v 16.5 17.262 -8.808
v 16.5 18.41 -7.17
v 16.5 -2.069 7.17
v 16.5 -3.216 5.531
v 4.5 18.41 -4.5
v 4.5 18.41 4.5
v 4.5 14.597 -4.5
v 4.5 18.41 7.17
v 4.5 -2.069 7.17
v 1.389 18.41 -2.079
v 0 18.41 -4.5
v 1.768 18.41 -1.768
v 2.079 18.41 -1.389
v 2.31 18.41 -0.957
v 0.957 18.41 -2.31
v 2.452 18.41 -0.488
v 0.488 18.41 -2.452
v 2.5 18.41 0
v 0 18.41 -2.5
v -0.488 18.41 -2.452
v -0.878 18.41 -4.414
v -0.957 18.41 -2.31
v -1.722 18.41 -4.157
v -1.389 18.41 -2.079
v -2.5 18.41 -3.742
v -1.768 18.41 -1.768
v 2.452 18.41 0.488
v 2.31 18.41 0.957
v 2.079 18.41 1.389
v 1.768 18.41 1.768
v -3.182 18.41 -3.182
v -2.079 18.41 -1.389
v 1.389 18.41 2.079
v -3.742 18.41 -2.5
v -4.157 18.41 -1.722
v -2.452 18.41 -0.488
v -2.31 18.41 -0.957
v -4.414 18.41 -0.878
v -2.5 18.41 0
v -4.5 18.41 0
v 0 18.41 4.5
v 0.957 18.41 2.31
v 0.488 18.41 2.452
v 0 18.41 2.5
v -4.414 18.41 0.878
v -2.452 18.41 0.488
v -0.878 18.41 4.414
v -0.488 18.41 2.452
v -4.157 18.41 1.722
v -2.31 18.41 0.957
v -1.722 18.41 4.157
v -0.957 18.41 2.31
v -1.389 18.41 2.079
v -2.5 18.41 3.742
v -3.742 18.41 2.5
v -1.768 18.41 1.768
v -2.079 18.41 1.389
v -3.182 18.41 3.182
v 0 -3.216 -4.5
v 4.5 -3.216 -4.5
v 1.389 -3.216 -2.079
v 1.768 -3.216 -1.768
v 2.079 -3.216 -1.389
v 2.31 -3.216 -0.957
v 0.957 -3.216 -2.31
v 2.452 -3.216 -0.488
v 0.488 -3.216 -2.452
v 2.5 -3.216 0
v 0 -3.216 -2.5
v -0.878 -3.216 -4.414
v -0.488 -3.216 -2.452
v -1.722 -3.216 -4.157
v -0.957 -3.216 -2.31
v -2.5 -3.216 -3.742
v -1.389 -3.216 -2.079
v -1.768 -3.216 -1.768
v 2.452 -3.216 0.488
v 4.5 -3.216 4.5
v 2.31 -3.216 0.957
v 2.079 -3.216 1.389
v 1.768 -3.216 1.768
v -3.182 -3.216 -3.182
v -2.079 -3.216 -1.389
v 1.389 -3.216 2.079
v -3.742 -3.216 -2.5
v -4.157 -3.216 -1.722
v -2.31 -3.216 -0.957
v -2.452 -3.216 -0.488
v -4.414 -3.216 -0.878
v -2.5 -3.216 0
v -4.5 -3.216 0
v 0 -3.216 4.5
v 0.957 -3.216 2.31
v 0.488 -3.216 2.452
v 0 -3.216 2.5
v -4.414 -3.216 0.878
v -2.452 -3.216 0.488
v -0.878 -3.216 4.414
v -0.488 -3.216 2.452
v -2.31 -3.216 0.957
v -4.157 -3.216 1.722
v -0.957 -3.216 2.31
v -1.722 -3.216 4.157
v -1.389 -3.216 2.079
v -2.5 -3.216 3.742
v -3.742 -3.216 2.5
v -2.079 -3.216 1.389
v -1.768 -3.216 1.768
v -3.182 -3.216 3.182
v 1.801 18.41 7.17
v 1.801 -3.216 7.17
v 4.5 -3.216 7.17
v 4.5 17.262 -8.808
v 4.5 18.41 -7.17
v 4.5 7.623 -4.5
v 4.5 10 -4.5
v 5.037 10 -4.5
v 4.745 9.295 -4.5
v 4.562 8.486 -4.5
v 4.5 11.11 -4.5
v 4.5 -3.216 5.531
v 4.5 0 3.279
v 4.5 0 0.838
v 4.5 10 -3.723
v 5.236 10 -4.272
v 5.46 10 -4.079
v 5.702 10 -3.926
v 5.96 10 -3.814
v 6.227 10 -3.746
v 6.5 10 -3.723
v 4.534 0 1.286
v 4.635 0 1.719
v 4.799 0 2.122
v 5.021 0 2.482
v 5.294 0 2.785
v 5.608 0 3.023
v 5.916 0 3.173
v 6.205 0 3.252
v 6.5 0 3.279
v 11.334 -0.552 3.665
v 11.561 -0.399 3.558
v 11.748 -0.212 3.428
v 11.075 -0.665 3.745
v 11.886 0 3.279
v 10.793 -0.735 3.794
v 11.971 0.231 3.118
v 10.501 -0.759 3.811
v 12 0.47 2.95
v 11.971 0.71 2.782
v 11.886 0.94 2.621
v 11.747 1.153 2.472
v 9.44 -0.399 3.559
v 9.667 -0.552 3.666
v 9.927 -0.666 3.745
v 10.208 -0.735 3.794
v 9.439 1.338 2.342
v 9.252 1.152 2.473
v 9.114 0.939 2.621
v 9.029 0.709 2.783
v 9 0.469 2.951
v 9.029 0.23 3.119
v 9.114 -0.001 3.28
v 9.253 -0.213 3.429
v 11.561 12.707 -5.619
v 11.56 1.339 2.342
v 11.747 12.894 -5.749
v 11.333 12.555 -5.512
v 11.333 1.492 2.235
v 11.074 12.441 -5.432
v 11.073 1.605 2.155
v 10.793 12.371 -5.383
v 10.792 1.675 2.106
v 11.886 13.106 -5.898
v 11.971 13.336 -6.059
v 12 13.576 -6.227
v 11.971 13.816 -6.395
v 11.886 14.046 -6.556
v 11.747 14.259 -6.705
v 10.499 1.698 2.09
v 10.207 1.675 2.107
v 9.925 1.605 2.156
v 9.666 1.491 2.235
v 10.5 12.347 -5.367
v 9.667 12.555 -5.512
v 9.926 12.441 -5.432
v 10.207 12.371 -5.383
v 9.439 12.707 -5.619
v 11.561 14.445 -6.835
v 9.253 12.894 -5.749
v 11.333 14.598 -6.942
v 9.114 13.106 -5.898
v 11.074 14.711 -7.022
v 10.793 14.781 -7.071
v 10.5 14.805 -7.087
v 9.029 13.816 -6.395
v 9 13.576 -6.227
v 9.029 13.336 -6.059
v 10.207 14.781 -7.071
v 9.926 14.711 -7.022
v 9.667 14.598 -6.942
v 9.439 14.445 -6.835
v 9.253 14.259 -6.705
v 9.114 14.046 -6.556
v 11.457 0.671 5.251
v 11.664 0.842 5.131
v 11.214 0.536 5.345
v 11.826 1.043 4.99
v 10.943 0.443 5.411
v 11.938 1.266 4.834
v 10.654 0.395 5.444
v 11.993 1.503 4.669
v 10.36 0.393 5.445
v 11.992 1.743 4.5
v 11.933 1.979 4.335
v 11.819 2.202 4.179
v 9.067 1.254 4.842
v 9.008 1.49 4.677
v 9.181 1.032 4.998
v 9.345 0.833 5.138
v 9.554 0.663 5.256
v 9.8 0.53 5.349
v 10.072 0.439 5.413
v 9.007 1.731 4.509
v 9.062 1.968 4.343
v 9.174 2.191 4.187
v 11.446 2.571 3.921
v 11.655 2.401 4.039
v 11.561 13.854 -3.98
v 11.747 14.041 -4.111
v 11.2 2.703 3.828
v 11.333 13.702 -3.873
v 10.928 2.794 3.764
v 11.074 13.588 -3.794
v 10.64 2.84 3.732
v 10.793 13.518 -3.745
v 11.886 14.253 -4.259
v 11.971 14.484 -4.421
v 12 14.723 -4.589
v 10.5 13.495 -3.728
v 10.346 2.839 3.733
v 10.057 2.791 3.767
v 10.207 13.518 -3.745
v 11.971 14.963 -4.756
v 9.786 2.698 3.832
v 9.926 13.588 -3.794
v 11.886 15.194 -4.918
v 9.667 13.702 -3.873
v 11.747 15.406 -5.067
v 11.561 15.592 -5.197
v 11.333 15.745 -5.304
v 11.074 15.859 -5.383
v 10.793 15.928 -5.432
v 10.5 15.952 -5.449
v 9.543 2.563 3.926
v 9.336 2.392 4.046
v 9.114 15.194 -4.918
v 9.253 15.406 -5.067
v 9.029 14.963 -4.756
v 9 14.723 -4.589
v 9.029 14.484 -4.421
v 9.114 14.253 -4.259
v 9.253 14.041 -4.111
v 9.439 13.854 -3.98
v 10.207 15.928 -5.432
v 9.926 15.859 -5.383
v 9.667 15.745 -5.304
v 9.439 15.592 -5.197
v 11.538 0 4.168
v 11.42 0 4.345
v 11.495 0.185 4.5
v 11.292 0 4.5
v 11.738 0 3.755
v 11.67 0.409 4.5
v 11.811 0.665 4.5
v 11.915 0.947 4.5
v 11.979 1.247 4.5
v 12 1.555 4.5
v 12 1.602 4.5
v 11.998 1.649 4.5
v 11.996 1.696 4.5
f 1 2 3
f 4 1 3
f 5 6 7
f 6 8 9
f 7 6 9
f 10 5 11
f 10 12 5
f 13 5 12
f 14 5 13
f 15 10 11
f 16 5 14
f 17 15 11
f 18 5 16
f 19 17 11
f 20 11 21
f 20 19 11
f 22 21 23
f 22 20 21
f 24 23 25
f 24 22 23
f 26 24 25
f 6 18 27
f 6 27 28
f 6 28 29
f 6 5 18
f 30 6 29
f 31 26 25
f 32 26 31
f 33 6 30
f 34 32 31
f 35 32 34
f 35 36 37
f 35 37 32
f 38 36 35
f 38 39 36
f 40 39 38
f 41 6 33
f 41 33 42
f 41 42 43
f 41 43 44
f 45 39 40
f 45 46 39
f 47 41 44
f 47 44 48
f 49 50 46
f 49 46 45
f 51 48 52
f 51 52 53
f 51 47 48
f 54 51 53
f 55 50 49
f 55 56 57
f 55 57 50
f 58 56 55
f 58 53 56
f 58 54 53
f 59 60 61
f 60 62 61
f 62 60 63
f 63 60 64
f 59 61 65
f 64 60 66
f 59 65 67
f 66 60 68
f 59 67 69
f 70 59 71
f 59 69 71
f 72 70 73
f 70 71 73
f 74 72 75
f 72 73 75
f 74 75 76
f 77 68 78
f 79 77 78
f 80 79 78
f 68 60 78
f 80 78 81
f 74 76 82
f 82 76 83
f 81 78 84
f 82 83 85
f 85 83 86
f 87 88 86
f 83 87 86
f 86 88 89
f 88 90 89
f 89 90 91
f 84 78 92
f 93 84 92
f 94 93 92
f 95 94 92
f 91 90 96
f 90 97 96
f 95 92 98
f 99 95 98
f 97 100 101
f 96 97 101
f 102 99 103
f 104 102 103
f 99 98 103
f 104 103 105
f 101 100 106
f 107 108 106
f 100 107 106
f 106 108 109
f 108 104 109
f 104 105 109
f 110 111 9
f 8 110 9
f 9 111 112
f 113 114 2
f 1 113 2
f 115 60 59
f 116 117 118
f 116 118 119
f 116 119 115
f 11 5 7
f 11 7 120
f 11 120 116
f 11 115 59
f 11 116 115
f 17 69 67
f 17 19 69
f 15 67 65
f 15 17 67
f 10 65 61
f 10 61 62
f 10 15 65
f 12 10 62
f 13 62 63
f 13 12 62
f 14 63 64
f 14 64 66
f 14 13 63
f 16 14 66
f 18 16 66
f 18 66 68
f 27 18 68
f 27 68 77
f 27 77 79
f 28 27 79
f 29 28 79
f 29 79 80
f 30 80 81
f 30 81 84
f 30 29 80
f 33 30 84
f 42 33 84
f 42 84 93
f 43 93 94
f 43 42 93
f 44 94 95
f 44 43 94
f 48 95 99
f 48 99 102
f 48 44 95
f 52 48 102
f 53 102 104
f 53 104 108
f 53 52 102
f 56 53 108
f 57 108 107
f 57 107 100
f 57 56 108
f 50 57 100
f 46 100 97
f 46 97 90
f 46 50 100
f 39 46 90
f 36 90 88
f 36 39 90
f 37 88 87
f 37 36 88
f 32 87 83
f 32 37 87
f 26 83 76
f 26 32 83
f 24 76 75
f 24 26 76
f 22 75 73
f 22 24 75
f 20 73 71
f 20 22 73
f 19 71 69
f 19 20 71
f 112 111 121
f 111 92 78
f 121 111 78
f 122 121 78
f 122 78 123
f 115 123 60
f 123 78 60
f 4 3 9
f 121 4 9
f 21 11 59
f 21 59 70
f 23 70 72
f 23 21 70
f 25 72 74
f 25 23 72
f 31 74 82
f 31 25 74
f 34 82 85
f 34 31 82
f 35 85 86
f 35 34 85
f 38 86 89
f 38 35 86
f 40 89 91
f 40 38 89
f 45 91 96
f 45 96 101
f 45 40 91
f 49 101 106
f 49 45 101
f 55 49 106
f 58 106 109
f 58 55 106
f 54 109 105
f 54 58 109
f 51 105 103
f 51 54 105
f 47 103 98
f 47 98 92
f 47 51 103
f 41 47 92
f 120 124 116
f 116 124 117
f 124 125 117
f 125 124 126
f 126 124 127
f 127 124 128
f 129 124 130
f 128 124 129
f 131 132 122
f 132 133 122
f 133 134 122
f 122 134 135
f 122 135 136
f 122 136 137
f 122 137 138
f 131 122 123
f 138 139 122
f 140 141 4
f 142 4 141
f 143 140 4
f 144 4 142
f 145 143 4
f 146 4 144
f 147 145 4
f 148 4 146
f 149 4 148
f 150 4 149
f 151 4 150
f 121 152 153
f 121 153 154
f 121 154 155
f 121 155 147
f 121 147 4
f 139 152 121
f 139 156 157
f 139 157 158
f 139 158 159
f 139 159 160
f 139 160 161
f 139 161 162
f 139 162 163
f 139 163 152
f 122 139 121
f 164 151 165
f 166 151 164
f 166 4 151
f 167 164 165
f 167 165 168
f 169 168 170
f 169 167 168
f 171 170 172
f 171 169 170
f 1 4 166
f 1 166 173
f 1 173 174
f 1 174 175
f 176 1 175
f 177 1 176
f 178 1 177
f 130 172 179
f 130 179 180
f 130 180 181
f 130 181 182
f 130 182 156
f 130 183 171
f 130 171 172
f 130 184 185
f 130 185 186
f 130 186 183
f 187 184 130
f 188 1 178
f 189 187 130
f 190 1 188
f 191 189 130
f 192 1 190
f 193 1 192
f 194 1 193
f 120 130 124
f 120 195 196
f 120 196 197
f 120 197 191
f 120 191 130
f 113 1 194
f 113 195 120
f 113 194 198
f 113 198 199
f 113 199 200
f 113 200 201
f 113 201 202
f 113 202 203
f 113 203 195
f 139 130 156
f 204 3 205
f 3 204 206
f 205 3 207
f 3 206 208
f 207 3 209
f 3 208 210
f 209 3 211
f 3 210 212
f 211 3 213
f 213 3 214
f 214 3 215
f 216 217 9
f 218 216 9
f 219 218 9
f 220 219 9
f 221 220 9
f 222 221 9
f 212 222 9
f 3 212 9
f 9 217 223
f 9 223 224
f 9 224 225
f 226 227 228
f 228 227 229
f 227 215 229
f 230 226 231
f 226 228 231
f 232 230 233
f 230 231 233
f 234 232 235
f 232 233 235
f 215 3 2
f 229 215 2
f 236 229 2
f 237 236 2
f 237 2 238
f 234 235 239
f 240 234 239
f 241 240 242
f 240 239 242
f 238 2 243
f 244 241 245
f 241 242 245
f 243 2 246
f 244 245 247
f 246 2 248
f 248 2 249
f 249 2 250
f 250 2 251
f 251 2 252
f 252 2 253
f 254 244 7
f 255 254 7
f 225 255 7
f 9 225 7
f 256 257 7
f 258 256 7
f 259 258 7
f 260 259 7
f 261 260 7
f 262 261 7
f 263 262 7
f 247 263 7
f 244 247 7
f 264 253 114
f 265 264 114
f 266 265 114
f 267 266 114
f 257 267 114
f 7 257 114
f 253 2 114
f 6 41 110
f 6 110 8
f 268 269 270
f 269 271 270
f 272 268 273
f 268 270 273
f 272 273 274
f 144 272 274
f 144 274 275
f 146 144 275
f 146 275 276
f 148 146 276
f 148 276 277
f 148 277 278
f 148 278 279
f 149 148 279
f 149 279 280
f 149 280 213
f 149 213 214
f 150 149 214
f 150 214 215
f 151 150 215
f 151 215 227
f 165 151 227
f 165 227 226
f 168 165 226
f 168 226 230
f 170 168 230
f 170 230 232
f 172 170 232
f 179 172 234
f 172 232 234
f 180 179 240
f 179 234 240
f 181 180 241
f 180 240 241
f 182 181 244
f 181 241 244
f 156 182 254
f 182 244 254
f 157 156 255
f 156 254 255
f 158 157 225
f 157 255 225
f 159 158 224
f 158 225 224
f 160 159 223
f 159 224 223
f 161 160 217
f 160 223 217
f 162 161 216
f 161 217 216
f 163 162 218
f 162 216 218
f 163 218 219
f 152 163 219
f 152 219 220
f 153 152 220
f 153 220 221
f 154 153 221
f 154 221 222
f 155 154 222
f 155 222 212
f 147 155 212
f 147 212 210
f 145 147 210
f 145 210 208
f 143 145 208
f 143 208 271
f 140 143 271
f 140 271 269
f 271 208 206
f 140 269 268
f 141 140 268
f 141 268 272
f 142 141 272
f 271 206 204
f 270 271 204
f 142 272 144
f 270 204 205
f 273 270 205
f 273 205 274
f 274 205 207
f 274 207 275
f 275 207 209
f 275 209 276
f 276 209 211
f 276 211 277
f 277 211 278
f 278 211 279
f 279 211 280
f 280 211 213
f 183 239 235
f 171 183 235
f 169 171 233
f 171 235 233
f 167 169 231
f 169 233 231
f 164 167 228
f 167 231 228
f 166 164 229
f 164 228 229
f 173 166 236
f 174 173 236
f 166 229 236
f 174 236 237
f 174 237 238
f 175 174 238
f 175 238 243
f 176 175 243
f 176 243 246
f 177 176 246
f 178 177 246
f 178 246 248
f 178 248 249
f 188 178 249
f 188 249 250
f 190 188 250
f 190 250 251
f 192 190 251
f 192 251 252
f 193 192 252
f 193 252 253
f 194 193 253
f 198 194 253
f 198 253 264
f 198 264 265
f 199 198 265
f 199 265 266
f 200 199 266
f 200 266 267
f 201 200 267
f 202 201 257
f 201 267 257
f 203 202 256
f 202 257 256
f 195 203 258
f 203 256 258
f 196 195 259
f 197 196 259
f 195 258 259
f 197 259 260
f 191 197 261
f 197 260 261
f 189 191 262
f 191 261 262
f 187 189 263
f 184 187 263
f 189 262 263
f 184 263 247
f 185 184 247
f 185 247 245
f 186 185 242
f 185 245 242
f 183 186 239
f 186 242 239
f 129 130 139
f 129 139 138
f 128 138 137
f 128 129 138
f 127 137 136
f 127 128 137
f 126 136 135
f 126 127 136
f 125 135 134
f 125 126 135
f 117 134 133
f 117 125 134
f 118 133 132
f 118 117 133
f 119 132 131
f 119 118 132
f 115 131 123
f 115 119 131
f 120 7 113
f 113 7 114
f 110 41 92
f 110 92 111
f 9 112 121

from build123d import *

# Parameters (mm, degrees)
CROQUIS1_R                   = 2.5000000000000004
SALIENTE_EXTRUIR1_DEPTH      = 10
SALIENTE_EXTRUIR2_DEPTH      = 12
CROQUIS3_R                   = 1.5000000000000024
SALIENTE_EXTRUIR3_DEPTH      = 2
REDONDEO1_R                  = 2
CROQUIS4_R                   = 1.5000000000000024
CORTAR_EXTRUIR1_DEPTH        = 6
SALIENTE_EXTRUIR4_DEPTH      = 3.21644
SALIENTE_EXTRUIR4_DEPTH_BACK = 18.409513
CROQUIS6_R                   = 2.5
SALIENTE_EXTRUIR5_START      = -21.625954
SALIENTE_EXTRUIR5_DEPTH      = 21.625954


with BuildPart() as part:
    # Croquis1 → Saliente-Extruir1 (new body)
    with BuildSketch(Plane(origin=(0, 0, 0), x_dir=(1, 0, 0), z_dir=(0, 1, 0))):
        with BuildLine():
            Line((0, -4.5), (4.5, -4.5))
            Line((4.5, -4.5), (4.5, 0))
            Line((4.5, 0), (4.5, 4.5))
            Line((4.5, 4.5), (0, 4.5))
            ThreePointArc((0, 4.5), (-4.5, 5.5e-16), (0, -4.5))
        make_face()
        with Locations(Location((0, 0, 0), (0, 0, 270))):
            Circle(CROQUIS1_R, mode=Mode.SUBTRACT)
    extrude(amount=SALIENTE_EXTRUIR1_DEPTH)

    # Croquis2 → Saliente-Extruir2 (add)
    with BuildSketch(Plane(origin=(4.5, 0, 0), x_dir=(0, 0, -1), z_dir=(1, 0, 0))):
        Polygon((-4.5, 0), (-4.5, 1.7434467956210846), (4.5, 14.596778856299984), (4.5, 11.10988526505781), (-3.2792254112385364, 0), align=None)
    extrude(amount=SALIENTE_EXTRUIR2_DEPTH)

    # Croquis3 → Saliente-Extruir3 (add)
    with BuildSketch(Plane(origin=(0, 2.68788483311935, 3.838697366771722), x_dir=(1, 0, 0), z_dir=(0, 0.57357643635105, 0.819152044288989))):
        Polygon((4.5, 19.19256462345726), (16.5, 19.19256462345726), (16.500000000000004, -5.807435376542737), (4.500000000000008, -5.807435376542739), align=None)
        with Locations(Location((10.5, 14.692564623457262, 0), (0, 0, 270))):
            Circle(CROQUIS3_R, mode=Mode.SUBTRACT)
        with Locations((10.500000000000002, -1.307435376542739)):
            Circle(CROQUIS3_R, mode=Mode.SUBTRACT)
    extrude(amount=-SALIENTE_EXTRUIR3_DEPTH)

    # Redondeo1
    # the kernel refuses this fillet: 2 mm, written as the material it adds along each edge
    with BuildSketch(Plane(origin=(4.5, 14.095760221444946, -6.590732152613882), x_dir=(0, -0.5735764363510499, -0.8191520442889891), z_dir=(0, -0.8191520442889891, 0.5735764363510499))) as redondeo1_piece_1_section:
        with BuildLine():
            CenterArc((REDONDEO1_R, REDONDEO1_R), REDONDEO1_R, 180, 90)
            Line((2.9e-16, REDONDEO1_R), (0, 0))
            Line((0, 0), (REDONDEO1_R, 0))
        make_face()
    redondeo1_piece_1 = extrude(amount=22.207745887614607, mode=Mode.PRIVATE)
    redondeo1_piece_1 = split(redondeo1_piece_1, bisect_by=Plane(origin=(4.952132948242019, 4.929093638164552, -4.5), z_dir=(0, 0, 1)), keep=Keep.TOP, mode=Mode.PRIVATE)
    redondeo1_piece_1 = split(redondeo1_piece_1, bisect_by=Plane(origin=(4.952132948242019, 10, -0.7036487498955591), z_dir=(0, -1, 0)), keep=Keep.TOP, mode=Mode.PRIVATE)
    redondeo1_piece_1 = split(redondeo1_piece_1, bisect_by=Plane(origin=(4.952132948242019, 0, -0.7036487498955591), z_dir=(0, 1, 0)), keep=Keep.TOP, mode=Mode.PRIVATE)
    add(redondeo1_piece_1)

    # Croquis4 → Cortar-Extruir1 (cut)
    with BuildSketch(Plane(origin=(0, 2.68788483311935, 3.838697366771722), x_dir=(1, 0, 0), z_dir=(0, 0.57357643635105, 0.819152044288989))):
        with Locations(Location((10.5, 14.69256462345726, 0), (0, 0, 270))):
            Circle(CROQUIS4_R)
        with Locations(Location((10.500000000000002, -1.3074353765427391, 0), (0, 0, 270))):
            Circle(CROQUIS4_R)
    extrude(amount=-CORTAR_EXTRUIR1_DEPTH, mode=Mode.SUBTRACT)

    # Croquis6 → Saliente-Extruir4 (add, two sides: drawn at the far end of the back side and taken through both)
    with BuildSketch(Plane.XZ.offset(-SALIENTE_EXTRUIR4_DEPTH_BACK)):
        with BuildLine():
            Line((4.5, -4.5), (0, -4.5))
            ThreePointArc((0, -4.5), (-4.5, 5.5e-16), (0, 4.5))
            Line((0, 4.5), (4.500000000000005, 4.5))
            Line((4.500000000000005, 4.5), (4.5, -4.5))
        make_face()
        with Locations(Location((0, 0, 0), (0, 0, 270))):
            Circle(CROQUIS6_R, mode=Mode.SUBTRACT)
    extrude(amount=SALIENTE_EXTRUIR4_DEPTH + SALIENTE_EXTRUIR4_DEPTH_BACK)

    # Croquis7 → Saliente-Extruir5 (add)
    with BuildSketch(Plane(origin=(0, 18.409513379572896, 0), x_dir=(1, 0, 0), z_dir=(0, 1, 0)).offset(SALIENTE_EXTRUIR5_START)):
        Polygon((5.5e-16, -4.5), (1.8007390664454916, -7.169705454388125), (4.500000000000005, -7.169705454388125), (4.500000000000005, -4.5), align=None)
    extrude(amount=SALIENTE_EXTRUIR5_DEPTH)


solid = part.part
